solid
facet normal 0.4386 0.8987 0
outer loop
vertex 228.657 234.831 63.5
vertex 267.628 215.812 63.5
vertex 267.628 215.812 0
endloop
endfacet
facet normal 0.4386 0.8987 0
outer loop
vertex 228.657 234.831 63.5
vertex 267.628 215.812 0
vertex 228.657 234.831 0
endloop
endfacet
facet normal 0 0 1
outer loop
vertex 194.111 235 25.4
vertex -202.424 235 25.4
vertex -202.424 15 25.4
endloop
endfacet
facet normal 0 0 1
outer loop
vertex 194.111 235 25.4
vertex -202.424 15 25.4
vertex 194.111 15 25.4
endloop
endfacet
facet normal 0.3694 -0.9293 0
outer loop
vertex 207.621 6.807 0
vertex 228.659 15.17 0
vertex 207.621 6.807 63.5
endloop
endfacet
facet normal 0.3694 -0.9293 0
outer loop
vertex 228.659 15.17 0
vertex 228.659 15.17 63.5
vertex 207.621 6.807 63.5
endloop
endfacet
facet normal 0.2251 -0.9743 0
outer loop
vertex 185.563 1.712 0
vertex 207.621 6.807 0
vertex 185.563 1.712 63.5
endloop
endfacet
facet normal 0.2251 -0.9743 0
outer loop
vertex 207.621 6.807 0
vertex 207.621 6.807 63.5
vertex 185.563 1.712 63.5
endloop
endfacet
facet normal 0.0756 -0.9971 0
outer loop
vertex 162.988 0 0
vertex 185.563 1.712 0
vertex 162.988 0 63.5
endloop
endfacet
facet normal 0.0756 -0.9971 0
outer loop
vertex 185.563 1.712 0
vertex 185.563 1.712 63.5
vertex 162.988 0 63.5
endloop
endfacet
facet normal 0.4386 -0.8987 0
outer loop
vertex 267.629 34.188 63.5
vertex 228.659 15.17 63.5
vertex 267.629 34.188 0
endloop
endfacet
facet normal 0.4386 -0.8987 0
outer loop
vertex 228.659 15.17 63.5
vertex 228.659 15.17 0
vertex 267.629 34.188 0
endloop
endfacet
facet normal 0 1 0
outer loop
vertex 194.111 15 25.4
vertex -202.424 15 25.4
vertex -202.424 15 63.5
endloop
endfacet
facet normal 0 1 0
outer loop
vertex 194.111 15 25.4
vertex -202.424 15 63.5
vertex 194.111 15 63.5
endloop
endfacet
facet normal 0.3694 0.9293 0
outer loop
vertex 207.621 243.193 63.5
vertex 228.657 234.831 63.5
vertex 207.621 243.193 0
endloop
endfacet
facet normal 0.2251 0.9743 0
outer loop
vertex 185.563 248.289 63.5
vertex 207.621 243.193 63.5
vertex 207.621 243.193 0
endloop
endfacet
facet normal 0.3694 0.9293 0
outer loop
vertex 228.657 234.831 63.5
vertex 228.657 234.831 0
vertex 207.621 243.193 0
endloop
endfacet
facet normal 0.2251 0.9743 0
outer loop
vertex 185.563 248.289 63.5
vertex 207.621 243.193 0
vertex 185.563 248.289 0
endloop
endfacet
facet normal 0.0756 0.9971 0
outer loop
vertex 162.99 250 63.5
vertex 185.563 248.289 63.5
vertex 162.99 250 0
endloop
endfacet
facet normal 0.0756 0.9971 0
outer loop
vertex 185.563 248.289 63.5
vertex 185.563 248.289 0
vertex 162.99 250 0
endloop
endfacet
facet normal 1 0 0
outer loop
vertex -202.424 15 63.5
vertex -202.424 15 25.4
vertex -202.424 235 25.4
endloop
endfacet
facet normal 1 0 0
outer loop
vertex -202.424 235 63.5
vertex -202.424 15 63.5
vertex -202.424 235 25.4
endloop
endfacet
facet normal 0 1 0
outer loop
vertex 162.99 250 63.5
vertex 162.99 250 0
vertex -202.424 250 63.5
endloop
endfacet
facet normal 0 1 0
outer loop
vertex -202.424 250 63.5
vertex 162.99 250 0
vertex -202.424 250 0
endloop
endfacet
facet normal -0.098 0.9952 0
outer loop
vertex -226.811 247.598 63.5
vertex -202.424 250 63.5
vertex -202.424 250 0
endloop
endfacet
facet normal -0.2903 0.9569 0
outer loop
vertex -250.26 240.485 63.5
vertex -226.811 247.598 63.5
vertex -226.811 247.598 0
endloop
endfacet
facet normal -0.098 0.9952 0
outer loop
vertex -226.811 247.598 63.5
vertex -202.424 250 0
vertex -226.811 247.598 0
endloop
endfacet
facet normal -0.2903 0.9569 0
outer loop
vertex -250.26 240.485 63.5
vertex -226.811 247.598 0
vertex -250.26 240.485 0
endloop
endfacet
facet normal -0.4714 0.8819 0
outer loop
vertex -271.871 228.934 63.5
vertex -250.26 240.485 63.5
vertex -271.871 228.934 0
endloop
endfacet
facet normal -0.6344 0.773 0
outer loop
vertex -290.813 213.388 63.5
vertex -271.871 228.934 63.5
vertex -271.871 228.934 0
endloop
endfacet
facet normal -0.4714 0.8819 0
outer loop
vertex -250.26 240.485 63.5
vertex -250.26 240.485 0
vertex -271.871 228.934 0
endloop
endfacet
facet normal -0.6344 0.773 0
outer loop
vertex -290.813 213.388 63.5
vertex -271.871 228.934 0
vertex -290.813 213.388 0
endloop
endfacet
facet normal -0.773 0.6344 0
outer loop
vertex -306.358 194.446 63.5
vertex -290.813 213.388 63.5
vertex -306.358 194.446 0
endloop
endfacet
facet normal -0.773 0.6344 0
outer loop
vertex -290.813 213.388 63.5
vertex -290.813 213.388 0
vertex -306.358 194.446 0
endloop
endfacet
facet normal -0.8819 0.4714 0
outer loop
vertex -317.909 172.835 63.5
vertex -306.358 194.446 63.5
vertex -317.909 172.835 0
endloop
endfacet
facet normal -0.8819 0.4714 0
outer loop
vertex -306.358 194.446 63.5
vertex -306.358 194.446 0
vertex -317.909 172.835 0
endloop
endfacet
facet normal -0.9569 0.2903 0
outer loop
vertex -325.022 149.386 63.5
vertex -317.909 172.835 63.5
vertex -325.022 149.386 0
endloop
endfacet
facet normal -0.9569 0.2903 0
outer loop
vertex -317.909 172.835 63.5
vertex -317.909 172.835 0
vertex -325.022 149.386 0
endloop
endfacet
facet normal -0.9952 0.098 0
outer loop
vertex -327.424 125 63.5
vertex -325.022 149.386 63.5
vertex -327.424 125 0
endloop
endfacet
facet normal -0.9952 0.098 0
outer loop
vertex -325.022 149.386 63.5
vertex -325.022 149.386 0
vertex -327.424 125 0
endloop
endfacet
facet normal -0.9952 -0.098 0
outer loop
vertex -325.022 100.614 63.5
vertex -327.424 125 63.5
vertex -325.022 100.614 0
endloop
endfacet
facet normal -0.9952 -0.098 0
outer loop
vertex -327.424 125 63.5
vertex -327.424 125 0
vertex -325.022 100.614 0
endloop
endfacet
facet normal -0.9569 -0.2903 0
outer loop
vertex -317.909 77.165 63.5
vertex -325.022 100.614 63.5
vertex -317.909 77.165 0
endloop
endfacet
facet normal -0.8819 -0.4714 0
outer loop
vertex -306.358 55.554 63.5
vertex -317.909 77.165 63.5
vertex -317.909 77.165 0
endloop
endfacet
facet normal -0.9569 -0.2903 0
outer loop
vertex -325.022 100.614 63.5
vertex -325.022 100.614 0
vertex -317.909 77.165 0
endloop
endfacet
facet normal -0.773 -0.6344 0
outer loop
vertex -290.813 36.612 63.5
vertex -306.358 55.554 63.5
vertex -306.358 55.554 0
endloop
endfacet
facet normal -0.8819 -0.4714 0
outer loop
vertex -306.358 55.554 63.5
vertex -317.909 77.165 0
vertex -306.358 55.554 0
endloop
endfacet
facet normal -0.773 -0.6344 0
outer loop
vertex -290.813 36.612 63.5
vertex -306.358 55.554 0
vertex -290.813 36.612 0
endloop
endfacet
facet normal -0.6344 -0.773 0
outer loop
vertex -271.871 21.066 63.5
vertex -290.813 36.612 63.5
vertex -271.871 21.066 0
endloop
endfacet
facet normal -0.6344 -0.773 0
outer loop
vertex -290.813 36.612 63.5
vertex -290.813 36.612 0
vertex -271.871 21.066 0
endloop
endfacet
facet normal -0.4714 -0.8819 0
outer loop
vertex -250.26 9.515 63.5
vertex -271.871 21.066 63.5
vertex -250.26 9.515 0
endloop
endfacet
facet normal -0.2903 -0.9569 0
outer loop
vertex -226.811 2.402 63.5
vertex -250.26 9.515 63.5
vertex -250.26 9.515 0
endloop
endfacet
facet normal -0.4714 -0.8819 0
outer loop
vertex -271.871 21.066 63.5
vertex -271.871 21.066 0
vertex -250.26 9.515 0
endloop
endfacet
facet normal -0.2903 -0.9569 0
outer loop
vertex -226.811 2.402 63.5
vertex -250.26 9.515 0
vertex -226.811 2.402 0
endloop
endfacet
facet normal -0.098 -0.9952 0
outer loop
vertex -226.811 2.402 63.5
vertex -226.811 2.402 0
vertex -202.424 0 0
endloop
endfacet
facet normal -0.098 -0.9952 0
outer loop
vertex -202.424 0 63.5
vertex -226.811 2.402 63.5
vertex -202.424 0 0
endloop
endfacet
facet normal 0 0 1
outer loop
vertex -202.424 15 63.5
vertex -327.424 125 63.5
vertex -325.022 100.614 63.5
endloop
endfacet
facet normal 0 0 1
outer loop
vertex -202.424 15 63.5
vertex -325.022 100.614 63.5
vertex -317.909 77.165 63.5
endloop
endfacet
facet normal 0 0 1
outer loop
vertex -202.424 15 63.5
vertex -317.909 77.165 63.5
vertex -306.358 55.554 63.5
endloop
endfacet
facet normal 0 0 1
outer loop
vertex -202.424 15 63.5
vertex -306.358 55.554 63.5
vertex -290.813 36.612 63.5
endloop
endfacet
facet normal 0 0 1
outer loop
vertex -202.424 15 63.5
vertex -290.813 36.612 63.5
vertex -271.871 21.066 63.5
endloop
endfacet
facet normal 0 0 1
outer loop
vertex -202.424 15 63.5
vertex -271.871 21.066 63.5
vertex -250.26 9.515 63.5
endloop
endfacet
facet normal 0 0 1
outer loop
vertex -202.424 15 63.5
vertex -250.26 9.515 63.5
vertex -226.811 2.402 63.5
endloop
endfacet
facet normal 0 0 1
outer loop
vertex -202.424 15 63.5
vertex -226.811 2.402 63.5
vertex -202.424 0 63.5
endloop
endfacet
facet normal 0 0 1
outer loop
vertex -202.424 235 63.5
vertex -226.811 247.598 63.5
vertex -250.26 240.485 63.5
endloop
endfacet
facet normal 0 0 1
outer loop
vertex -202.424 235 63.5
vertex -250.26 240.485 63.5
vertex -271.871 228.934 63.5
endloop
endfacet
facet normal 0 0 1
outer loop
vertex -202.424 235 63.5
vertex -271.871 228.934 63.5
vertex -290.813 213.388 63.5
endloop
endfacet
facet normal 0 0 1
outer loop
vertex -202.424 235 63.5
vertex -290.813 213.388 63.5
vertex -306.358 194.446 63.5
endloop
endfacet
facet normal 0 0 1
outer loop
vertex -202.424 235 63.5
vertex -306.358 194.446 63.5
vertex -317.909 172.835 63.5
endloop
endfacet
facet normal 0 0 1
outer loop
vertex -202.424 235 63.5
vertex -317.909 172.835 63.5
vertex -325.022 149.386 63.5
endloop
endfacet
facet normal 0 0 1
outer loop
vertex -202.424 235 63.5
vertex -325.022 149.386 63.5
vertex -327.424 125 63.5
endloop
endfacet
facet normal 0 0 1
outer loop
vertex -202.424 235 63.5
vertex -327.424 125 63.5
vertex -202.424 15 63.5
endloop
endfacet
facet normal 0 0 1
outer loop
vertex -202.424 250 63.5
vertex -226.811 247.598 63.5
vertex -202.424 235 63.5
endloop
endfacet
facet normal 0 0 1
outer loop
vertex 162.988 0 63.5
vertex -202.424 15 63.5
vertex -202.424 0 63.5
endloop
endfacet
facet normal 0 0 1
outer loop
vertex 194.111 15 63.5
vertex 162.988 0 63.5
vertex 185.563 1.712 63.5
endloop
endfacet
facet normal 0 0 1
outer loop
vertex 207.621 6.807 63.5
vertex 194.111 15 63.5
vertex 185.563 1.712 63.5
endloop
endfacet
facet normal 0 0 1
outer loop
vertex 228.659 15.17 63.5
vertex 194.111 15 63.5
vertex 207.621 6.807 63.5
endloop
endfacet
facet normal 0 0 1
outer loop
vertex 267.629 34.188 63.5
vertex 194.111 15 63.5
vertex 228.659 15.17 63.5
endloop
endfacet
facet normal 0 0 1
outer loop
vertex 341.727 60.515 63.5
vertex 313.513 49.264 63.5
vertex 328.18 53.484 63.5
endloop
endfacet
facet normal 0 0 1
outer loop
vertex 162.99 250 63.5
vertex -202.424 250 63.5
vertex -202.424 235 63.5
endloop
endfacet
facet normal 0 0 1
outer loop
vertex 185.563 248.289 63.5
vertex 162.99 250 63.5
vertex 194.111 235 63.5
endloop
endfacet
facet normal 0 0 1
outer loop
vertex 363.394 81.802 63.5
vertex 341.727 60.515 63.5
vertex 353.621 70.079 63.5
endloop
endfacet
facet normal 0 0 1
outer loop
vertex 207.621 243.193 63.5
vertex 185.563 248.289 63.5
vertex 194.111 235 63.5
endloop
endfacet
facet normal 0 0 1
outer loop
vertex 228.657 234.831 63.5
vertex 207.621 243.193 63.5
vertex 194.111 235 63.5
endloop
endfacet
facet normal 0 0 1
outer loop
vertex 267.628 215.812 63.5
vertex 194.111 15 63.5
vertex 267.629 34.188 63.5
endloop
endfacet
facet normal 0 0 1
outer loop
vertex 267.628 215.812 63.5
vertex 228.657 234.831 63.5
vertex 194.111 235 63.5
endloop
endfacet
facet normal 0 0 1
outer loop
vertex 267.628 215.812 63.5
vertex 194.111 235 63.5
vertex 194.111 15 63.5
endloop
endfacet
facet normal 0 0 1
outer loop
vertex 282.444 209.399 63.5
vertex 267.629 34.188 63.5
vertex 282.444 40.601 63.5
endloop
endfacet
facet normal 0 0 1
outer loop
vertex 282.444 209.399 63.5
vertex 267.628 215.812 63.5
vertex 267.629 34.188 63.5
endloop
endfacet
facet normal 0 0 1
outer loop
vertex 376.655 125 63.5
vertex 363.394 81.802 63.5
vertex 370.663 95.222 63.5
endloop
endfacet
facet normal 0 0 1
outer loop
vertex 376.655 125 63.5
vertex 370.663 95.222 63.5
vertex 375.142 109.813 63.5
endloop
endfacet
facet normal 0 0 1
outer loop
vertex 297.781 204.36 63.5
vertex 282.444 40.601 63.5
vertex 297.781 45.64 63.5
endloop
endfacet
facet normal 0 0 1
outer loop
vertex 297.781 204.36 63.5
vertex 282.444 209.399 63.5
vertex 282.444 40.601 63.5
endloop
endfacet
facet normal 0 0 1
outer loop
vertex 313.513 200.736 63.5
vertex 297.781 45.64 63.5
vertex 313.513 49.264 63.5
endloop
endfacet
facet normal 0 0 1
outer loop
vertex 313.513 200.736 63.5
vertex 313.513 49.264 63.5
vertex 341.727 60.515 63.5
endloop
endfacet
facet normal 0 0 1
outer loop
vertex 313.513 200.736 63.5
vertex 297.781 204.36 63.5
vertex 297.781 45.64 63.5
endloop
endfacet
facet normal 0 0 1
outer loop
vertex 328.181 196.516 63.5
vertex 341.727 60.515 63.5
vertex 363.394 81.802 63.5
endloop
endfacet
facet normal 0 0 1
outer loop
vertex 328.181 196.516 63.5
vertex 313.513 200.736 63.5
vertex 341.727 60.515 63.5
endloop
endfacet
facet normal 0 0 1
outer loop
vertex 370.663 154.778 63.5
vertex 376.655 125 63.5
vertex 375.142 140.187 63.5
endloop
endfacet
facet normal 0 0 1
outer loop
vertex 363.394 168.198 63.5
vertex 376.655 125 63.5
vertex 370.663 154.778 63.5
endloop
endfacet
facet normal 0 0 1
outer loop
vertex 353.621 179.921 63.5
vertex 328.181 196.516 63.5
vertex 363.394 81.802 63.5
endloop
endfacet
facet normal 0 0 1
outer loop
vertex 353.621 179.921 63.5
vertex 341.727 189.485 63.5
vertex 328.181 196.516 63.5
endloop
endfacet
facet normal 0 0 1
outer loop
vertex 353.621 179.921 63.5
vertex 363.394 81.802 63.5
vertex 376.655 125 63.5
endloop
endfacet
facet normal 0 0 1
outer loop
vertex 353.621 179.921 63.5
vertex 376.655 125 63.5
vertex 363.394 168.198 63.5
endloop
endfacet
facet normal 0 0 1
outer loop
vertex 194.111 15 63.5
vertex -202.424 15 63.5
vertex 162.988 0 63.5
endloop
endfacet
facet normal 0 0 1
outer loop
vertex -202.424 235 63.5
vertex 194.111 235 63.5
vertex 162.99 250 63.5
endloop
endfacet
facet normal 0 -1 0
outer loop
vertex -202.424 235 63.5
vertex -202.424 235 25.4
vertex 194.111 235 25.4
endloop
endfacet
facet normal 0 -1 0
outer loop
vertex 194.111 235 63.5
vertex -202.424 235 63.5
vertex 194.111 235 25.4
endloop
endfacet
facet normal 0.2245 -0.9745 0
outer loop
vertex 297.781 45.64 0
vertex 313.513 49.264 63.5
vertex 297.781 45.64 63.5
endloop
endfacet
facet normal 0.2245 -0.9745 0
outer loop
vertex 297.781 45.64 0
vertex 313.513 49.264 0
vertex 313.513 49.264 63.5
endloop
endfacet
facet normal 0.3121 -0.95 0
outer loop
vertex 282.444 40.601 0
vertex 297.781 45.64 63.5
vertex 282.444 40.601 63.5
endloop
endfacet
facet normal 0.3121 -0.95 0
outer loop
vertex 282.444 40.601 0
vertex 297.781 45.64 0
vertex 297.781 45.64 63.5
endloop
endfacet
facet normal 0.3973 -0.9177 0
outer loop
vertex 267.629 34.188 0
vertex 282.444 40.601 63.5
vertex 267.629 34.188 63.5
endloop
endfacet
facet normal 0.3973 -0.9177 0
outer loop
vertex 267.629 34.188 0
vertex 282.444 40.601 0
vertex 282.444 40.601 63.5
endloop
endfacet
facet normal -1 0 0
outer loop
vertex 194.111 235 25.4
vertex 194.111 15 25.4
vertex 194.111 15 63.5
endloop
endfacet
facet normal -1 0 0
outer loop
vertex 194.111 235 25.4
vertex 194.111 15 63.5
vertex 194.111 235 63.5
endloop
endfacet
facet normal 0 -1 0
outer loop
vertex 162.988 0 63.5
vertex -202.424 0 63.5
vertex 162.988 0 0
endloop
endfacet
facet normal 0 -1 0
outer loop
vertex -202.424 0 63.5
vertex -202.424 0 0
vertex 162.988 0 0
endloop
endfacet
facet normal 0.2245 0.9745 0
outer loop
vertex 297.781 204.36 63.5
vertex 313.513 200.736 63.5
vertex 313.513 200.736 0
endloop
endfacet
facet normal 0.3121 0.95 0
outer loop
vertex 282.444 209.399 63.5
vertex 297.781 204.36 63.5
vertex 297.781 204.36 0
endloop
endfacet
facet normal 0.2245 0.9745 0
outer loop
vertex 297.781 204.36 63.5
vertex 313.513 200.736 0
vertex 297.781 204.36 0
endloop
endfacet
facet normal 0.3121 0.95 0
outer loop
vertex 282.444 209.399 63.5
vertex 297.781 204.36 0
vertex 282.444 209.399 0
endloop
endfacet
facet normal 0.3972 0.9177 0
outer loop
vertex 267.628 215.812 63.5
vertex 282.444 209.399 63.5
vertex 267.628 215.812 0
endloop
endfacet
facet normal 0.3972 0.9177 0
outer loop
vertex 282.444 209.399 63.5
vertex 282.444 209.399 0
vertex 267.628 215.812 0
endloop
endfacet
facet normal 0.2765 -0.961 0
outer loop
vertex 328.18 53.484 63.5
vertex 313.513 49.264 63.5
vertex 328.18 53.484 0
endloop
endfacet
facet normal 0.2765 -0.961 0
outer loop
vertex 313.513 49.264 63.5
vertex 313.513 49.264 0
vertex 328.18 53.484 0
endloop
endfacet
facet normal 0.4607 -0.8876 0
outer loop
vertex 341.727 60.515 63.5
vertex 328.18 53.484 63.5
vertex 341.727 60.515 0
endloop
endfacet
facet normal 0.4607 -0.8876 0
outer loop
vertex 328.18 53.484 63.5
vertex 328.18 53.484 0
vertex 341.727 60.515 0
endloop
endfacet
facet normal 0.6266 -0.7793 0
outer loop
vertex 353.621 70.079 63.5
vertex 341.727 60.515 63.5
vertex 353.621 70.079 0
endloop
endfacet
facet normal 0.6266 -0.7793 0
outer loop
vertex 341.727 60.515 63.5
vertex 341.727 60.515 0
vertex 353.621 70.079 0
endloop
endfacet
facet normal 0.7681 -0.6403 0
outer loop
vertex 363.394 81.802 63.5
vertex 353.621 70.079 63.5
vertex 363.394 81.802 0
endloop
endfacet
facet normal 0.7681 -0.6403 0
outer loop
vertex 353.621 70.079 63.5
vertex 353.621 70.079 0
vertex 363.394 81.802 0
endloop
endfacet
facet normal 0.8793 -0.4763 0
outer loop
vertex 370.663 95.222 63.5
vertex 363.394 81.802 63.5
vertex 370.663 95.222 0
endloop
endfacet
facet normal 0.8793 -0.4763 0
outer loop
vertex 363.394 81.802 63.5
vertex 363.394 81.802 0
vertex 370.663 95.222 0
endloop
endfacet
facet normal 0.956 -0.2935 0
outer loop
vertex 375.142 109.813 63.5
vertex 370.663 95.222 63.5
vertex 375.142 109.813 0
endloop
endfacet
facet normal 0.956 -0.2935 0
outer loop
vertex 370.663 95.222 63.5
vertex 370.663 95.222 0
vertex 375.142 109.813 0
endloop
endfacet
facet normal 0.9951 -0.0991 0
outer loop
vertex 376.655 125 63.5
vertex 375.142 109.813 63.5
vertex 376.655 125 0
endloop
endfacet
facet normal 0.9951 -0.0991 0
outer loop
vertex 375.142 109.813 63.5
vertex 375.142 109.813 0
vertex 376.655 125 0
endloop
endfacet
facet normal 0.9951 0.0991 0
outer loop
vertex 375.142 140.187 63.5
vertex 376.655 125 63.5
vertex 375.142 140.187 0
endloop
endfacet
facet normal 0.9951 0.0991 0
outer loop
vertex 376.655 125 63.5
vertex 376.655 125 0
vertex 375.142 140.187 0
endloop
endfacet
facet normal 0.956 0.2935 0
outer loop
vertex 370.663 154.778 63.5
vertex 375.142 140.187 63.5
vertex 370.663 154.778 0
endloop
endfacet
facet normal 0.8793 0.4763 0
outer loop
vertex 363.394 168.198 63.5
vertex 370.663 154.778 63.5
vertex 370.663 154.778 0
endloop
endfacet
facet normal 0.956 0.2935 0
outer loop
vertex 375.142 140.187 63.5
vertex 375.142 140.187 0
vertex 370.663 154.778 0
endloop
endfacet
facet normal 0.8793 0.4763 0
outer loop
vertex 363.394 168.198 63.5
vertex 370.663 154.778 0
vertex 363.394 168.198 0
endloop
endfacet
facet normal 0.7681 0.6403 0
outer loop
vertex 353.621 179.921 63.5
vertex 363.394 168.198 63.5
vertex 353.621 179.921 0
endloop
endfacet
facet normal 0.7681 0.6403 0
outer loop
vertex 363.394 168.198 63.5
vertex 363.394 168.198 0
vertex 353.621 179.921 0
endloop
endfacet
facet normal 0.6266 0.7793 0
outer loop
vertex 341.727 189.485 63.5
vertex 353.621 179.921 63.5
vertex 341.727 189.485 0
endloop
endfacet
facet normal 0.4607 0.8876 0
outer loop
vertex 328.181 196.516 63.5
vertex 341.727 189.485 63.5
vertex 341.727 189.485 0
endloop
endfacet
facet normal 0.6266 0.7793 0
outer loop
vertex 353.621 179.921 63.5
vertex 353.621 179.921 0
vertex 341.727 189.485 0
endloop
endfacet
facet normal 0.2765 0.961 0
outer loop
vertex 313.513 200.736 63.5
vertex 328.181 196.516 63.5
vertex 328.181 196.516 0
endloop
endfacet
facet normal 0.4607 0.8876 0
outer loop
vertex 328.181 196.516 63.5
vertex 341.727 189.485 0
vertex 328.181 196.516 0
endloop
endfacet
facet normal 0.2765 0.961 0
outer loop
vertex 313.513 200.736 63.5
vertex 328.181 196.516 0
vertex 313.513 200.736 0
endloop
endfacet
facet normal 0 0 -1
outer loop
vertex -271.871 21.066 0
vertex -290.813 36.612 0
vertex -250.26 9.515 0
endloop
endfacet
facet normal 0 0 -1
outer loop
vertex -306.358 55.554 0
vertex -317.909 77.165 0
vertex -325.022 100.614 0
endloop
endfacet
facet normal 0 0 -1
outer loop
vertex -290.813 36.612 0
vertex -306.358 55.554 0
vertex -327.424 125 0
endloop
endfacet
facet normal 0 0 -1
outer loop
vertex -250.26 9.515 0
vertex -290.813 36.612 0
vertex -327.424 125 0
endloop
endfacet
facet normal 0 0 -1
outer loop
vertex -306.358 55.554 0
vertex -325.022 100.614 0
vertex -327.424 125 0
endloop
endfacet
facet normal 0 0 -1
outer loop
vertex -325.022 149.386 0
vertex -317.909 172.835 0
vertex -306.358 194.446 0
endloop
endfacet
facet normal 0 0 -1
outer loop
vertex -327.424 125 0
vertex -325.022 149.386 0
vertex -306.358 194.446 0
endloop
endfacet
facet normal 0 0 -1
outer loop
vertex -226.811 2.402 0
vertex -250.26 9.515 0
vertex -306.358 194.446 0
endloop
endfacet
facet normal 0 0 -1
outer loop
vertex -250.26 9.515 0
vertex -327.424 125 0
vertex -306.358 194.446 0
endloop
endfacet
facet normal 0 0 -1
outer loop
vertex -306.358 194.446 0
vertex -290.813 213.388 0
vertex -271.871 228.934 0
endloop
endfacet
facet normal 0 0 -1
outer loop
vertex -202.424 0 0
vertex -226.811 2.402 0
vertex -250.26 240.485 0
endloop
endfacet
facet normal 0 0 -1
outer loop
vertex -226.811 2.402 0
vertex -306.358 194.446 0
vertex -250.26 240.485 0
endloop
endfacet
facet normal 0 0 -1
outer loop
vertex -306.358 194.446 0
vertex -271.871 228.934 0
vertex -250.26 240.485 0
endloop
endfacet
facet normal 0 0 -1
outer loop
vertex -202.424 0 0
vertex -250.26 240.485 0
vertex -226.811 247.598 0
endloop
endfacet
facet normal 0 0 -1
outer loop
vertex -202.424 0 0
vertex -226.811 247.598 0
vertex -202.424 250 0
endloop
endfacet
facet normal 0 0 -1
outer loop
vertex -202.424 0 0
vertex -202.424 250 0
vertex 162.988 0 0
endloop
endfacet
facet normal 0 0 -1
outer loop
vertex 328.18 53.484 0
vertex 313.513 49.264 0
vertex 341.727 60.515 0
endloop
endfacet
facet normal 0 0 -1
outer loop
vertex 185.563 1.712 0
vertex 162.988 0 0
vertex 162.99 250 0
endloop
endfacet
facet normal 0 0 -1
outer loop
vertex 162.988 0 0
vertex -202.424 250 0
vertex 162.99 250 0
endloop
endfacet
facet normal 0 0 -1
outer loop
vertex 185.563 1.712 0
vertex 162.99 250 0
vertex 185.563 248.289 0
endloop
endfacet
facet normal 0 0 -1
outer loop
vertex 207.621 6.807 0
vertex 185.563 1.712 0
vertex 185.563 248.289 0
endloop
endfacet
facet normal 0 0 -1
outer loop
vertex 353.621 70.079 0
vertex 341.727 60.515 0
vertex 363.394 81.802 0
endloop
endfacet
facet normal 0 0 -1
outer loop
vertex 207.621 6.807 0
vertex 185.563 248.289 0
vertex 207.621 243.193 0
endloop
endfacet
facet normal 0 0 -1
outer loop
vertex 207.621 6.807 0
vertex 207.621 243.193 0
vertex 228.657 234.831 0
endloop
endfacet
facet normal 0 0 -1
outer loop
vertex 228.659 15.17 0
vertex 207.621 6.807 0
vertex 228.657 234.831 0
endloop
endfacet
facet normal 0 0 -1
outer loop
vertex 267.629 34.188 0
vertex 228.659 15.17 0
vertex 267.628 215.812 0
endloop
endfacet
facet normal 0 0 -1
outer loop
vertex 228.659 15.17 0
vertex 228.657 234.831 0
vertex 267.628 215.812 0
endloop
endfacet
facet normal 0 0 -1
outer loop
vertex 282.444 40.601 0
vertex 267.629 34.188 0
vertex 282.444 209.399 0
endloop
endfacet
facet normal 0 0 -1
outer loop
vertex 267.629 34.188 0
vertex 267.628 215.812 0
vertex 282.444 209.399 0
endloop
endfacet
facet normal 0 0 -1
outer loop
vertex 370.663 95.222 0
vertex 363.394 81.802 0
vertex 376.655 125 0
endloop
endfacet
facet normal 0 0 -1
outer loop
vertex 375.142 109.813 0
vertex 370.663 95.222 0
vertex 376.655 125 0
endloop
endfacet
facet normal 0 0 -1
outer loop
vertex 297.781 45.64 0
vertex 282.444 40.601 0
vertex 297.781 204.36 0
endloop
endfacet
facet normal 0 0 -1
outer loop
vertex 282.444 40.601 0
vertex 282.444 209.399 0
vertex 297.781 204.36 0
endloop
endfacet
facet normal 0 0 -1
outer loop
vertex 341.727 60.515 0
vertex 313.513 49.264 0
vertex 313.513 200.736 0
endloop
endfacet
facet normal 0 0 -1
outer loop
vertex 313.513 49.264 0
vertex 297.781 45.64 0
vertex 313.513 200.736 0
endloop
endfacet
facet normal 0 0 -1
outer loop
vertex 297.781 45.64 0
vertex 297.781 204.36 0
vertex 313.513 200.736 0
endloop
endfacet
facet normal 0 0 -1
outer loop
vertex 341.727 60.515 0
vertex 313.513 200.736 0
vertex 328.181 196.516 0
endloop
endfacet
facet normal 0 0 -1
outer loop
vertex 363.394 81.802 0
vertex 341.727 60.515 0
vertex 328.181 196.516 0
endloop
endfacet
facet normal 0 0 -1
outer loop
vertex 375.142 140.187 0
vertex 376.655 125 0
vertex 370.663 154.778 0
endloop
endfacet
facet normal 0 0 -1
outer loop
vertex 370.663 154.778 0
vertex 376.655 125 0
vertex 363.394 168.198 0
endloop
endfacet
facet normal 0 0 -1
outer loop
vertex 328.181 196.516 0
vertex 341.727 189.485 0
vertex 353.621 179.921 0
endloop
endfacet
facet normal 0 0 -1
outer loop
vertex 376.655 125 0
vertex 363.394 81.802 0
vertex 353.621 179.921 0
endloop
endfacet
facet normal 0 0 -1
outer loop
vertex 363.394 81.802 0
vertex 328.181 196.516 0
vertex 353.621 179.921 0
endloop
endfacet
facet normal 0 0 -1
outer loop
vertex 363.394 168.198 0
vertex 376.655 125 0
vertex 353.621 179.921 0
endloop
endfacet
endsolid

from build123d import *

# Parameters (mm, degrees)
F1_DEPTH = 25.4
F2_W     = 396.535074
F2_H     = 220
F3_DEPTH = 38.1
F4_R     = 177.372541
F5_R     = 149.724354
F6_R     = 177.3682
F7_R     = 149.733


with BuildPart() as f1:
    # F0 (on Top) → F1 (new body)
    with BuildSketch(Plane.XY):
        with BuildLine():
            ThreePointArc((-202.424236, 250), (-327.424236, 125), (-202.424236, 0))
            Line((-202.424236, 0), (197.575764, 0))
            Line((197.575764, 0), (296.114177, 48.089784))
            ThreePointArc((296.114177, 48.089784), (376.654646, 125), (296.114177, 201.910216))
            Line((296.114177, 201.910216), (197.575764, 250))
            Line((197.575764, 250), (-202.424236, 250))
        make_face()
    extrude(amount=F1_DEPTH)

    # F2 (on face) → F3 (join)
    with BuildSketch(Plane.XY.offset(25.4)):
        with BuildLine():
            Line((197.575764, 250), (-202.424236, 250))
            ThreePointArc((-202.424236, 250), (-327.424236, 125), (-202.424236, 0))
            Line((-202.424236, 0), (197.575764, 0))
            Line((197.575764, 0), (296.114177, 48.089784))
            ThreePointArc((296.114177, 48.089784), (376.654646, 125), (296.114177, 201.910216))
            Line((296.114177, 201.910216), (197.575764, 250))
        make_face()
        with Locations((-4.156699, 125)):
            Rectangle(F2_W, F2_H, mode=Mode.SUBTRACT)
    extrude(amount=F3_DEPTH)

    # F4
    f4_edges = [f1.edges().sort_by_distance(p)[0] for p in [
        (296.114177, 201.910216, 31.75),
    ]]
    fillet(f4_edges, radius=F4_R)

    # F5
    f5_edges = [f1.edges().sort_by_distance(p)[0] for p in [
        (197.575764, 250, 31.75),
    ]]
    fillet(f5_edges, radius=F5_R)

    # F6
    f6_edges = [f1.edges().sort_by_distance(p)[0] for p in [
        (296.114177, 48.089784, 31.75),
    ]]
    fillet(f6_edges, radius=F6_R)

    # F7
    f7_edges = [f1.edges().sort_by_distance(p)[0] for p in [
        (197.575764, 0, 31.75),
    ]]
    fillet(f7_edges, radius=F7_R)


solid = f1.part
